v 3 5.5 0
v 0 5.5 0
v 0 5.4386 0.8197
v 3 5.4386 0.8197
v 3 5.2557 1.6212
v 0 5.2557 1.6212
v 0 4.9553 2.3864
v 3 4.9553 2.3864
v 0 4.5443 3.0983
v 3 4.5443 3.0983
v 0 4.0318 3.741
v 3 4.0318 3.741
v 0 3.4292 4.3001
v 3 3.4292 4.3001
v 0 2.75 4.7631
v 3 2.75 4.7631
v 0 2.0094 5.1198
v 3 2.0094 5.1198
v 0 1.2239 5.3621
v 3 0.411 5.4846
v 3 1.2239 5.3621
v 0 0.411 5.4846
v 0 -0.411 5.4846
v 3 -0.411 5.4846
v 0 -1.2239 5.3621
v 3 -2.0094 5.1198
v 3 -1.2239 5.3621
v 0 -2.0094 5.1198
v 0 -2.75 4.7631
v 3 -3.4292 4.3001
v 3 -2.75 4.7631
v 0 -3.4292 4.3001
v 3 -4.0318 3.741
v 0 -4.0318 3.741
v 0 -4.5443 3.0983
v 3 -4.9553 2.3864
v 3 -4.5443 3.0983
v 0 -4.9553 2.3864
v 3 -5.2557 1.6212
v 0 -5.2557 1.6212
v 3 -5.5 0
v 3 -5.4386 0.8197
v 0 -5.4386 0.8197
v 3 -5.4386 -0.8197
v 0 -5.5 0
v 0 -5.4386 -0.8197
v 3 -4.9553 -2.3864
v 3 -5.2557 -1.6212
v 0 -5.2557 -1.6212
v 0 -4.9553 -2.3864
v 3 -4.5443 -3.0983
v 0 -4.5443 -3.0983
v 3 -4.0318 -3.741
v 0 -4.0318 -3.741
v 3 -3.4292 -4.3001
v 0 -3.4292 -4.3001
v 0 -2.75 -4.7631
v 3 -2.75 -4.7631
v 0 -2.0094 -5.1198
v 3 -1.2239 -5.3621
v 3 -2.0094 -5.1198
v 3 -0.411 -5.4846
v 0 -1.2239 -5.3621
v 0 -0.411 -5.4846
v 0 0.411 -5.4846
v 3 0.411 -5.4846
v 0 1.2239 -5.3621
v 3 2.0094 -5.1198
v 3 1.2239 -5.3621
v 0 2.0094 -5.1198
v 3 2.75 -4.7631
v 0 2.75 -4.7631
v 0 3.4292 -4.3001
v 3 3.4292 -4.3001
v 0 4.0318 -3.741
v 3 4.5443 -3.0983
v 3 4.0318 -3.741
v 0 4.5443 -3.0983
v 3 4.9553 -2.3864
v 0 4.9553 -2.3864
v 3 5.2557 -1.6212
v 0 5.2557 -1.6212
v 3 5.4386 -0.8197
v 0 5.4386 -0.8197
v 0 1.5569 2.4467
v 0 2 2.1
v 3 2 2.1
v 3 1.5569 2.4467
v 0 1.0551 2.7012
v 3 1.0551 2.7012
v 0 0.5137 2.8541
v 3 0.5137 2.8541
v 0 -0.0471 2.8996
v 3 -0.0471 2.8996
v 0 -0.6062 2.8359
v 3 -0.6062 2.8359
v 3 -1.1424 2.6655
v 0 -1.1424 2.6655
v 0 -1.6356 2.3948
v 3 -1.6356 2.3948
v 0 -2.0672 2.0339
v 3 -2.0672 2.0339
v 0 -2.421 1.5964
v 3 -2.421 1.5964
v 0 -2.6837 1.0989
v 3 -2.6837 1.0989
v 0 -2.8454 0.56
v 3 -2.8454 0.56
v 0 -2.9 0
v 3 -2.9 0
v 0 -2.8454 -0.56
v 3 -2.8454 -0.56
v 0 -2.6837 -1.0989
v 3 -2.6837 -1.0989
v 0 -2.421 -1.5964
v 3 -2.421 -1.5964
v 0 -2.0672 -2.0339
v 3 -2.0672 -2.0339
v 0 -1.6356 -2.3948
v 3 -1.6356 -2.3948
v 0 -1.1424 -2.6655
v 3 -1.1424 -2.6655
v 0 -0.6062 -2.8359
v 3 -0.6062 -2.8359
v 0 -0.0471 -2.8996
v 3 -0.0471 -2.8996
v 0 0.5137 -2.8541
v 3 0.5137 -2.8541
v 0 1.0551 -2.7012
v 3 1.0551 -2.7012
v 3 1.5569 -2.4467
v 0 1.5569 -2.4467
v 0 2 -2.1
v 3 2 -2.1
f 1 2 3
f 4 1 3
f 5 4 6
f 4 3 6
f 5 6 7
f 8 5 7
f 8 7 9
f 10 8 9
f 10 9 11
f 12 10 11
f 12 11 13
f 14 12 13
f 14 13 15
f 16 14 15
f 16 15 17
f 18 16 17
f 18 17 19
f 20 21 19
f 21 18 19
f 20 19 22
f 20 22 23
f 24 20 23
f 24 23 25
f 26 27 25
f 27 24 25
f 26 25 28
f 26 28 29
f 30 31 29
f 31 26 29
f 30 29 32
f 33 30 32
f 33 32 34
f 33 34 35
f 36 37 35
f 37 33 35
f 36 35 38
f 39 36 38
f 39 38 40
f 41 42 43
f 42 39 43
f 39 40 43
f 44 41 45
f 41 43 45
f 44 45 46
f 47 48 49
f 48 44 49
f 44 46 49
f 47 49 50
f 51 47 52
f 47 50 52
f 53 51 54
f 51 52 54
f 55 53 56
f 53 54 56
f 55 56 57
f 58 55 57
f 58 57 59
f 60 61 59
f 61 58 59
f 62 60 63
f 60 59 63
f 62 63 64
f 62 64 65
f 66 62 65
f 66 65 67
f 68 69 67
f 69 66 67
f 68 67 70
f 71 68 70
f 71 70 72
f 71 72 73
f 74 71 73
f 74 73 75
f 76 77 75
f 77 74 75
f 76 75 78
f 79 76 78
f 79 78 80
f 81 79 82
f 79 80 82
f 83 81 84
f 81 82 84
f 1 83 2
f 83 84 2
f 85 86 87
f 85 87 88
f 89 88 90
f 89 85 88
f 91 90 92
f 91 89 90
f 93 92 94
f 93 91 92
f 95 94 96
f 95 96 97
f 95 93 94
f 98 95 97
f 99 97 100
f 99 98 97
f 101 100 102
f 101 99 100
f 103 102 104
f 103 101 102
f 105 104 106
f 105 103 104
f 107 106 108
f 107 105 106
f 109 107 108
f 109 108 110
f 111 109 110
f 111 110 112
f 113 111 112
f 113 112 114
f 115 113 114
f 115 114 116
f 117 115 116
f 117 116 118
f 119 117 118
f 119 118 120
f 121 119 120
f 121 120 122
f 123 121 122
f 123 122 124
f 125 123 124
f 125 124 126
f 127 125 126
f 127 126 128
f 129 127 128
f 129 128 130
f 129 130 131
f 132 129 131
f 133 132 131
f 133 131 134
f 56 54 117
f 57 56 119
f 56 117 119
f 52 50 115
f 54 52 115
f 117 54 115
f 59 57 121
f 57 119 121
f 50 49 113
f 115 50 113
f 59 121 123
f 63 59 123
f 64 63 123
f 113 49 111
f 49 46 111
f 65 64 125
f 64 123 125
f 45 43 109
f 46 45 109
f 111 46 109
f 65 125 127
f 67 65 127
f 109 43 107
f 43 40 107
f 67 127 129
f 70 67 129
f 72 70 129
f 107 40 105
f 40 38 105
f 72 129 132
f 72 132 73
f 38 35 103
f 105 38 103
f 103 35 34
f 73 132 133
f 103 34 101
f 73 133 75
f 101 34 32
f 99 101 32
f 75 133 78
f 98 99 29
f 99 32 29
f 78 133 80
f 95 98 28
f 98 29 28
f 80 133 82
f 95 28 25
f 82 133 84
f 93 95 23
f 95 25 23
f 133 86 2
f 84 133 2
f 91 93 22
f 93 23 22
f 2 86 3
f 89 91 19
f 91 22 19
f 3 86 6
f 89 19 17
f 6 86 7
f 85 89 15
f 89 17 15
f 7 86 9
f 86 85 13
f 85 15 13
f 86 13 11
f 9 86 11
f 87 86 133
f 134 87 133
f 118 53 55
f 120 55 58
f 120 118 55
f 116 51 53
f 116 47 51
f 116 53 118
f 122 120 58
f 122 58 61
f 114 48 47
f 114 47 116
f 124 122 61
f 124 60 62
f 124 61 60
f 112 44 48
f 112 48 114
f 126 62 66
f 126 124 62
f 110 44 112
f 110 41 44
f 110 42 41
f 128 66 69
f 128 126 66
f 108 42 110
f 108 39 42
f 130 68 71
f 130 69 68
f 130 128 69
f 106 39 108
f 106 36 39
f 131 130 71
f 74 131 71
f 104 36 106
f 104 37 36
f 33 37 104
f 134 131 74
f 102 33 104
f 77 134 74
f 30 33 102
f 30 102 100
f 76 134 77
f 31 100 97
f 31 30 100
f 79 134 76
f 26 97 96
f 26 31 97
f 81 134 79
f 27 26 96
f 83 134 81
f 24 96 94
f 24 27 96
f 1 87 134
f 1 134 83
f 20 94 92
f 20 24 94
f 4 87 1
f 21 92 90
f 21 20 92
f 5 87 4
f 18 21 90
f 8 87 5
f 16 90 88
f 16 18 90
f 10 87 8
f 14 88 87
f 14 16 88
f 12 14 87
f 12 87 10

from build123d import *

# Parameters (mm, degrees)
F0_R     = 2.9
F1_DEPTH = 3
F3_DEPTH = 3
F4_R     = 14.864409
F4_R_2   = 5.5
F5_DEPTH = 25.4


with BuildPart() as f1:
    # F0 (on Right) → F1 (new body)
    with BuildSketch(Plane.YZ):
        Polygon((0.84, 10.466346), (0, 12.5), (-0.838096, 10.465561), (-1.993439, 12.338134), (-2.494335, 10.1956), (-3.935098, 11.858594), (-4.085821, 9.663455), (-5.77469, 11.073799), (-5.571336, 8.88291), (-7.46457, 10.004076), (-6.912406, 7.874179), (-8.96097, 8.67713), (-8.074297, 6.663388), (-10.225136, 7.127329), (-9.026918, 5.281896), (-11.224325, 5.39481), (-9.745595, 3.765483), (-11.932659, 3.524446), (-10.211716, 2.153423), (-12.331793, 1.564677), (-10.413209, 0.487468), (-12.41139, -0.433738), (-10.344854, -1.189236), (-12.169387, -2.419043), (-10.008422, -2.833261), (-11.612053, -4.339818), (-9.412626, -4.402029), (-10.753822, -6.146318), (-8.572898, -5.85491), (-9.616923, -7.791753), (-7.510986, -7.154275), (-8.230799, -9.23351), (-6.254392, -8.26647), (-6.631351, -10.434246), (-4.835663, -9.162691), (-4.860004, -11.362863), (-3.291541, -9.819726), (-2.962635, -11.995311), (-1.66202, -10.220558), (-0.988385, -12.315209), (0.010698, -10.354806), (1.011615, -12.314273), (1.683289, -10.218992), (2.985565, -11.992527), (3.312434, -9.816635), (4.882341, -11.358303), (4.85594, -9.158155), (6.652818, -10.428028), (6.27383, -8.260606), (8.251141, -9.225795), (7.529382, -7.147235), (9.635915, -7.782742), (8.590078, -5.846877), (10.771274, -6.136242), (9.428445, -4.39321), (11.627813, -4.32894), (10.022772, -2.823885), (12.183349, -2.407644), (10.357664, -1.179545), (12.423493, -0.422113), (10.42445, 0.497221), (12.342025, 1.576227), (10.221398, 2.162987), (11.941057, 3.53562), (9.753768, 3.77461), (11.230972, 5.405321), (9.033671, 5.29035), (10.230161, 7.136903), (8.079758, 6.670949), (8.964545, 8.685521), (6.916733, 7.880652), (7.466903, 10.011065), (5.57472, 8.888127), (5.776023, 11.079206), (4.088475, 9.667282), (3.935697, 11.862278), (2.496491, 10.197936), (1.99359, 12.34), align=None)
        Circle(F0_R, mode=Mode.SUBTRACT)
    extrude(amount=F1_DEPTH)

    # F2 (on Right) → F3 (join)
    with BuildSketch(Plane.YZ):
        with BuildLine():
            ThreePointArc((2, -2.1), (2.9, 0), (2, 2.1))
            Line((2, 2.1), (2, -2.1))
        make_face()
    extrude(amount=F3_DEPTH)

    # F4 (on Right) → F5 (cut)
    with BuildSketch(Plane.YZ):
        Circle(F4_R)
        Circle(F4_R_2, mode=Mode.SUBTRACT)
    extrude(amount=F5_DEPTH, mode=Mode.SUBTRACT)


solid = f1.part
